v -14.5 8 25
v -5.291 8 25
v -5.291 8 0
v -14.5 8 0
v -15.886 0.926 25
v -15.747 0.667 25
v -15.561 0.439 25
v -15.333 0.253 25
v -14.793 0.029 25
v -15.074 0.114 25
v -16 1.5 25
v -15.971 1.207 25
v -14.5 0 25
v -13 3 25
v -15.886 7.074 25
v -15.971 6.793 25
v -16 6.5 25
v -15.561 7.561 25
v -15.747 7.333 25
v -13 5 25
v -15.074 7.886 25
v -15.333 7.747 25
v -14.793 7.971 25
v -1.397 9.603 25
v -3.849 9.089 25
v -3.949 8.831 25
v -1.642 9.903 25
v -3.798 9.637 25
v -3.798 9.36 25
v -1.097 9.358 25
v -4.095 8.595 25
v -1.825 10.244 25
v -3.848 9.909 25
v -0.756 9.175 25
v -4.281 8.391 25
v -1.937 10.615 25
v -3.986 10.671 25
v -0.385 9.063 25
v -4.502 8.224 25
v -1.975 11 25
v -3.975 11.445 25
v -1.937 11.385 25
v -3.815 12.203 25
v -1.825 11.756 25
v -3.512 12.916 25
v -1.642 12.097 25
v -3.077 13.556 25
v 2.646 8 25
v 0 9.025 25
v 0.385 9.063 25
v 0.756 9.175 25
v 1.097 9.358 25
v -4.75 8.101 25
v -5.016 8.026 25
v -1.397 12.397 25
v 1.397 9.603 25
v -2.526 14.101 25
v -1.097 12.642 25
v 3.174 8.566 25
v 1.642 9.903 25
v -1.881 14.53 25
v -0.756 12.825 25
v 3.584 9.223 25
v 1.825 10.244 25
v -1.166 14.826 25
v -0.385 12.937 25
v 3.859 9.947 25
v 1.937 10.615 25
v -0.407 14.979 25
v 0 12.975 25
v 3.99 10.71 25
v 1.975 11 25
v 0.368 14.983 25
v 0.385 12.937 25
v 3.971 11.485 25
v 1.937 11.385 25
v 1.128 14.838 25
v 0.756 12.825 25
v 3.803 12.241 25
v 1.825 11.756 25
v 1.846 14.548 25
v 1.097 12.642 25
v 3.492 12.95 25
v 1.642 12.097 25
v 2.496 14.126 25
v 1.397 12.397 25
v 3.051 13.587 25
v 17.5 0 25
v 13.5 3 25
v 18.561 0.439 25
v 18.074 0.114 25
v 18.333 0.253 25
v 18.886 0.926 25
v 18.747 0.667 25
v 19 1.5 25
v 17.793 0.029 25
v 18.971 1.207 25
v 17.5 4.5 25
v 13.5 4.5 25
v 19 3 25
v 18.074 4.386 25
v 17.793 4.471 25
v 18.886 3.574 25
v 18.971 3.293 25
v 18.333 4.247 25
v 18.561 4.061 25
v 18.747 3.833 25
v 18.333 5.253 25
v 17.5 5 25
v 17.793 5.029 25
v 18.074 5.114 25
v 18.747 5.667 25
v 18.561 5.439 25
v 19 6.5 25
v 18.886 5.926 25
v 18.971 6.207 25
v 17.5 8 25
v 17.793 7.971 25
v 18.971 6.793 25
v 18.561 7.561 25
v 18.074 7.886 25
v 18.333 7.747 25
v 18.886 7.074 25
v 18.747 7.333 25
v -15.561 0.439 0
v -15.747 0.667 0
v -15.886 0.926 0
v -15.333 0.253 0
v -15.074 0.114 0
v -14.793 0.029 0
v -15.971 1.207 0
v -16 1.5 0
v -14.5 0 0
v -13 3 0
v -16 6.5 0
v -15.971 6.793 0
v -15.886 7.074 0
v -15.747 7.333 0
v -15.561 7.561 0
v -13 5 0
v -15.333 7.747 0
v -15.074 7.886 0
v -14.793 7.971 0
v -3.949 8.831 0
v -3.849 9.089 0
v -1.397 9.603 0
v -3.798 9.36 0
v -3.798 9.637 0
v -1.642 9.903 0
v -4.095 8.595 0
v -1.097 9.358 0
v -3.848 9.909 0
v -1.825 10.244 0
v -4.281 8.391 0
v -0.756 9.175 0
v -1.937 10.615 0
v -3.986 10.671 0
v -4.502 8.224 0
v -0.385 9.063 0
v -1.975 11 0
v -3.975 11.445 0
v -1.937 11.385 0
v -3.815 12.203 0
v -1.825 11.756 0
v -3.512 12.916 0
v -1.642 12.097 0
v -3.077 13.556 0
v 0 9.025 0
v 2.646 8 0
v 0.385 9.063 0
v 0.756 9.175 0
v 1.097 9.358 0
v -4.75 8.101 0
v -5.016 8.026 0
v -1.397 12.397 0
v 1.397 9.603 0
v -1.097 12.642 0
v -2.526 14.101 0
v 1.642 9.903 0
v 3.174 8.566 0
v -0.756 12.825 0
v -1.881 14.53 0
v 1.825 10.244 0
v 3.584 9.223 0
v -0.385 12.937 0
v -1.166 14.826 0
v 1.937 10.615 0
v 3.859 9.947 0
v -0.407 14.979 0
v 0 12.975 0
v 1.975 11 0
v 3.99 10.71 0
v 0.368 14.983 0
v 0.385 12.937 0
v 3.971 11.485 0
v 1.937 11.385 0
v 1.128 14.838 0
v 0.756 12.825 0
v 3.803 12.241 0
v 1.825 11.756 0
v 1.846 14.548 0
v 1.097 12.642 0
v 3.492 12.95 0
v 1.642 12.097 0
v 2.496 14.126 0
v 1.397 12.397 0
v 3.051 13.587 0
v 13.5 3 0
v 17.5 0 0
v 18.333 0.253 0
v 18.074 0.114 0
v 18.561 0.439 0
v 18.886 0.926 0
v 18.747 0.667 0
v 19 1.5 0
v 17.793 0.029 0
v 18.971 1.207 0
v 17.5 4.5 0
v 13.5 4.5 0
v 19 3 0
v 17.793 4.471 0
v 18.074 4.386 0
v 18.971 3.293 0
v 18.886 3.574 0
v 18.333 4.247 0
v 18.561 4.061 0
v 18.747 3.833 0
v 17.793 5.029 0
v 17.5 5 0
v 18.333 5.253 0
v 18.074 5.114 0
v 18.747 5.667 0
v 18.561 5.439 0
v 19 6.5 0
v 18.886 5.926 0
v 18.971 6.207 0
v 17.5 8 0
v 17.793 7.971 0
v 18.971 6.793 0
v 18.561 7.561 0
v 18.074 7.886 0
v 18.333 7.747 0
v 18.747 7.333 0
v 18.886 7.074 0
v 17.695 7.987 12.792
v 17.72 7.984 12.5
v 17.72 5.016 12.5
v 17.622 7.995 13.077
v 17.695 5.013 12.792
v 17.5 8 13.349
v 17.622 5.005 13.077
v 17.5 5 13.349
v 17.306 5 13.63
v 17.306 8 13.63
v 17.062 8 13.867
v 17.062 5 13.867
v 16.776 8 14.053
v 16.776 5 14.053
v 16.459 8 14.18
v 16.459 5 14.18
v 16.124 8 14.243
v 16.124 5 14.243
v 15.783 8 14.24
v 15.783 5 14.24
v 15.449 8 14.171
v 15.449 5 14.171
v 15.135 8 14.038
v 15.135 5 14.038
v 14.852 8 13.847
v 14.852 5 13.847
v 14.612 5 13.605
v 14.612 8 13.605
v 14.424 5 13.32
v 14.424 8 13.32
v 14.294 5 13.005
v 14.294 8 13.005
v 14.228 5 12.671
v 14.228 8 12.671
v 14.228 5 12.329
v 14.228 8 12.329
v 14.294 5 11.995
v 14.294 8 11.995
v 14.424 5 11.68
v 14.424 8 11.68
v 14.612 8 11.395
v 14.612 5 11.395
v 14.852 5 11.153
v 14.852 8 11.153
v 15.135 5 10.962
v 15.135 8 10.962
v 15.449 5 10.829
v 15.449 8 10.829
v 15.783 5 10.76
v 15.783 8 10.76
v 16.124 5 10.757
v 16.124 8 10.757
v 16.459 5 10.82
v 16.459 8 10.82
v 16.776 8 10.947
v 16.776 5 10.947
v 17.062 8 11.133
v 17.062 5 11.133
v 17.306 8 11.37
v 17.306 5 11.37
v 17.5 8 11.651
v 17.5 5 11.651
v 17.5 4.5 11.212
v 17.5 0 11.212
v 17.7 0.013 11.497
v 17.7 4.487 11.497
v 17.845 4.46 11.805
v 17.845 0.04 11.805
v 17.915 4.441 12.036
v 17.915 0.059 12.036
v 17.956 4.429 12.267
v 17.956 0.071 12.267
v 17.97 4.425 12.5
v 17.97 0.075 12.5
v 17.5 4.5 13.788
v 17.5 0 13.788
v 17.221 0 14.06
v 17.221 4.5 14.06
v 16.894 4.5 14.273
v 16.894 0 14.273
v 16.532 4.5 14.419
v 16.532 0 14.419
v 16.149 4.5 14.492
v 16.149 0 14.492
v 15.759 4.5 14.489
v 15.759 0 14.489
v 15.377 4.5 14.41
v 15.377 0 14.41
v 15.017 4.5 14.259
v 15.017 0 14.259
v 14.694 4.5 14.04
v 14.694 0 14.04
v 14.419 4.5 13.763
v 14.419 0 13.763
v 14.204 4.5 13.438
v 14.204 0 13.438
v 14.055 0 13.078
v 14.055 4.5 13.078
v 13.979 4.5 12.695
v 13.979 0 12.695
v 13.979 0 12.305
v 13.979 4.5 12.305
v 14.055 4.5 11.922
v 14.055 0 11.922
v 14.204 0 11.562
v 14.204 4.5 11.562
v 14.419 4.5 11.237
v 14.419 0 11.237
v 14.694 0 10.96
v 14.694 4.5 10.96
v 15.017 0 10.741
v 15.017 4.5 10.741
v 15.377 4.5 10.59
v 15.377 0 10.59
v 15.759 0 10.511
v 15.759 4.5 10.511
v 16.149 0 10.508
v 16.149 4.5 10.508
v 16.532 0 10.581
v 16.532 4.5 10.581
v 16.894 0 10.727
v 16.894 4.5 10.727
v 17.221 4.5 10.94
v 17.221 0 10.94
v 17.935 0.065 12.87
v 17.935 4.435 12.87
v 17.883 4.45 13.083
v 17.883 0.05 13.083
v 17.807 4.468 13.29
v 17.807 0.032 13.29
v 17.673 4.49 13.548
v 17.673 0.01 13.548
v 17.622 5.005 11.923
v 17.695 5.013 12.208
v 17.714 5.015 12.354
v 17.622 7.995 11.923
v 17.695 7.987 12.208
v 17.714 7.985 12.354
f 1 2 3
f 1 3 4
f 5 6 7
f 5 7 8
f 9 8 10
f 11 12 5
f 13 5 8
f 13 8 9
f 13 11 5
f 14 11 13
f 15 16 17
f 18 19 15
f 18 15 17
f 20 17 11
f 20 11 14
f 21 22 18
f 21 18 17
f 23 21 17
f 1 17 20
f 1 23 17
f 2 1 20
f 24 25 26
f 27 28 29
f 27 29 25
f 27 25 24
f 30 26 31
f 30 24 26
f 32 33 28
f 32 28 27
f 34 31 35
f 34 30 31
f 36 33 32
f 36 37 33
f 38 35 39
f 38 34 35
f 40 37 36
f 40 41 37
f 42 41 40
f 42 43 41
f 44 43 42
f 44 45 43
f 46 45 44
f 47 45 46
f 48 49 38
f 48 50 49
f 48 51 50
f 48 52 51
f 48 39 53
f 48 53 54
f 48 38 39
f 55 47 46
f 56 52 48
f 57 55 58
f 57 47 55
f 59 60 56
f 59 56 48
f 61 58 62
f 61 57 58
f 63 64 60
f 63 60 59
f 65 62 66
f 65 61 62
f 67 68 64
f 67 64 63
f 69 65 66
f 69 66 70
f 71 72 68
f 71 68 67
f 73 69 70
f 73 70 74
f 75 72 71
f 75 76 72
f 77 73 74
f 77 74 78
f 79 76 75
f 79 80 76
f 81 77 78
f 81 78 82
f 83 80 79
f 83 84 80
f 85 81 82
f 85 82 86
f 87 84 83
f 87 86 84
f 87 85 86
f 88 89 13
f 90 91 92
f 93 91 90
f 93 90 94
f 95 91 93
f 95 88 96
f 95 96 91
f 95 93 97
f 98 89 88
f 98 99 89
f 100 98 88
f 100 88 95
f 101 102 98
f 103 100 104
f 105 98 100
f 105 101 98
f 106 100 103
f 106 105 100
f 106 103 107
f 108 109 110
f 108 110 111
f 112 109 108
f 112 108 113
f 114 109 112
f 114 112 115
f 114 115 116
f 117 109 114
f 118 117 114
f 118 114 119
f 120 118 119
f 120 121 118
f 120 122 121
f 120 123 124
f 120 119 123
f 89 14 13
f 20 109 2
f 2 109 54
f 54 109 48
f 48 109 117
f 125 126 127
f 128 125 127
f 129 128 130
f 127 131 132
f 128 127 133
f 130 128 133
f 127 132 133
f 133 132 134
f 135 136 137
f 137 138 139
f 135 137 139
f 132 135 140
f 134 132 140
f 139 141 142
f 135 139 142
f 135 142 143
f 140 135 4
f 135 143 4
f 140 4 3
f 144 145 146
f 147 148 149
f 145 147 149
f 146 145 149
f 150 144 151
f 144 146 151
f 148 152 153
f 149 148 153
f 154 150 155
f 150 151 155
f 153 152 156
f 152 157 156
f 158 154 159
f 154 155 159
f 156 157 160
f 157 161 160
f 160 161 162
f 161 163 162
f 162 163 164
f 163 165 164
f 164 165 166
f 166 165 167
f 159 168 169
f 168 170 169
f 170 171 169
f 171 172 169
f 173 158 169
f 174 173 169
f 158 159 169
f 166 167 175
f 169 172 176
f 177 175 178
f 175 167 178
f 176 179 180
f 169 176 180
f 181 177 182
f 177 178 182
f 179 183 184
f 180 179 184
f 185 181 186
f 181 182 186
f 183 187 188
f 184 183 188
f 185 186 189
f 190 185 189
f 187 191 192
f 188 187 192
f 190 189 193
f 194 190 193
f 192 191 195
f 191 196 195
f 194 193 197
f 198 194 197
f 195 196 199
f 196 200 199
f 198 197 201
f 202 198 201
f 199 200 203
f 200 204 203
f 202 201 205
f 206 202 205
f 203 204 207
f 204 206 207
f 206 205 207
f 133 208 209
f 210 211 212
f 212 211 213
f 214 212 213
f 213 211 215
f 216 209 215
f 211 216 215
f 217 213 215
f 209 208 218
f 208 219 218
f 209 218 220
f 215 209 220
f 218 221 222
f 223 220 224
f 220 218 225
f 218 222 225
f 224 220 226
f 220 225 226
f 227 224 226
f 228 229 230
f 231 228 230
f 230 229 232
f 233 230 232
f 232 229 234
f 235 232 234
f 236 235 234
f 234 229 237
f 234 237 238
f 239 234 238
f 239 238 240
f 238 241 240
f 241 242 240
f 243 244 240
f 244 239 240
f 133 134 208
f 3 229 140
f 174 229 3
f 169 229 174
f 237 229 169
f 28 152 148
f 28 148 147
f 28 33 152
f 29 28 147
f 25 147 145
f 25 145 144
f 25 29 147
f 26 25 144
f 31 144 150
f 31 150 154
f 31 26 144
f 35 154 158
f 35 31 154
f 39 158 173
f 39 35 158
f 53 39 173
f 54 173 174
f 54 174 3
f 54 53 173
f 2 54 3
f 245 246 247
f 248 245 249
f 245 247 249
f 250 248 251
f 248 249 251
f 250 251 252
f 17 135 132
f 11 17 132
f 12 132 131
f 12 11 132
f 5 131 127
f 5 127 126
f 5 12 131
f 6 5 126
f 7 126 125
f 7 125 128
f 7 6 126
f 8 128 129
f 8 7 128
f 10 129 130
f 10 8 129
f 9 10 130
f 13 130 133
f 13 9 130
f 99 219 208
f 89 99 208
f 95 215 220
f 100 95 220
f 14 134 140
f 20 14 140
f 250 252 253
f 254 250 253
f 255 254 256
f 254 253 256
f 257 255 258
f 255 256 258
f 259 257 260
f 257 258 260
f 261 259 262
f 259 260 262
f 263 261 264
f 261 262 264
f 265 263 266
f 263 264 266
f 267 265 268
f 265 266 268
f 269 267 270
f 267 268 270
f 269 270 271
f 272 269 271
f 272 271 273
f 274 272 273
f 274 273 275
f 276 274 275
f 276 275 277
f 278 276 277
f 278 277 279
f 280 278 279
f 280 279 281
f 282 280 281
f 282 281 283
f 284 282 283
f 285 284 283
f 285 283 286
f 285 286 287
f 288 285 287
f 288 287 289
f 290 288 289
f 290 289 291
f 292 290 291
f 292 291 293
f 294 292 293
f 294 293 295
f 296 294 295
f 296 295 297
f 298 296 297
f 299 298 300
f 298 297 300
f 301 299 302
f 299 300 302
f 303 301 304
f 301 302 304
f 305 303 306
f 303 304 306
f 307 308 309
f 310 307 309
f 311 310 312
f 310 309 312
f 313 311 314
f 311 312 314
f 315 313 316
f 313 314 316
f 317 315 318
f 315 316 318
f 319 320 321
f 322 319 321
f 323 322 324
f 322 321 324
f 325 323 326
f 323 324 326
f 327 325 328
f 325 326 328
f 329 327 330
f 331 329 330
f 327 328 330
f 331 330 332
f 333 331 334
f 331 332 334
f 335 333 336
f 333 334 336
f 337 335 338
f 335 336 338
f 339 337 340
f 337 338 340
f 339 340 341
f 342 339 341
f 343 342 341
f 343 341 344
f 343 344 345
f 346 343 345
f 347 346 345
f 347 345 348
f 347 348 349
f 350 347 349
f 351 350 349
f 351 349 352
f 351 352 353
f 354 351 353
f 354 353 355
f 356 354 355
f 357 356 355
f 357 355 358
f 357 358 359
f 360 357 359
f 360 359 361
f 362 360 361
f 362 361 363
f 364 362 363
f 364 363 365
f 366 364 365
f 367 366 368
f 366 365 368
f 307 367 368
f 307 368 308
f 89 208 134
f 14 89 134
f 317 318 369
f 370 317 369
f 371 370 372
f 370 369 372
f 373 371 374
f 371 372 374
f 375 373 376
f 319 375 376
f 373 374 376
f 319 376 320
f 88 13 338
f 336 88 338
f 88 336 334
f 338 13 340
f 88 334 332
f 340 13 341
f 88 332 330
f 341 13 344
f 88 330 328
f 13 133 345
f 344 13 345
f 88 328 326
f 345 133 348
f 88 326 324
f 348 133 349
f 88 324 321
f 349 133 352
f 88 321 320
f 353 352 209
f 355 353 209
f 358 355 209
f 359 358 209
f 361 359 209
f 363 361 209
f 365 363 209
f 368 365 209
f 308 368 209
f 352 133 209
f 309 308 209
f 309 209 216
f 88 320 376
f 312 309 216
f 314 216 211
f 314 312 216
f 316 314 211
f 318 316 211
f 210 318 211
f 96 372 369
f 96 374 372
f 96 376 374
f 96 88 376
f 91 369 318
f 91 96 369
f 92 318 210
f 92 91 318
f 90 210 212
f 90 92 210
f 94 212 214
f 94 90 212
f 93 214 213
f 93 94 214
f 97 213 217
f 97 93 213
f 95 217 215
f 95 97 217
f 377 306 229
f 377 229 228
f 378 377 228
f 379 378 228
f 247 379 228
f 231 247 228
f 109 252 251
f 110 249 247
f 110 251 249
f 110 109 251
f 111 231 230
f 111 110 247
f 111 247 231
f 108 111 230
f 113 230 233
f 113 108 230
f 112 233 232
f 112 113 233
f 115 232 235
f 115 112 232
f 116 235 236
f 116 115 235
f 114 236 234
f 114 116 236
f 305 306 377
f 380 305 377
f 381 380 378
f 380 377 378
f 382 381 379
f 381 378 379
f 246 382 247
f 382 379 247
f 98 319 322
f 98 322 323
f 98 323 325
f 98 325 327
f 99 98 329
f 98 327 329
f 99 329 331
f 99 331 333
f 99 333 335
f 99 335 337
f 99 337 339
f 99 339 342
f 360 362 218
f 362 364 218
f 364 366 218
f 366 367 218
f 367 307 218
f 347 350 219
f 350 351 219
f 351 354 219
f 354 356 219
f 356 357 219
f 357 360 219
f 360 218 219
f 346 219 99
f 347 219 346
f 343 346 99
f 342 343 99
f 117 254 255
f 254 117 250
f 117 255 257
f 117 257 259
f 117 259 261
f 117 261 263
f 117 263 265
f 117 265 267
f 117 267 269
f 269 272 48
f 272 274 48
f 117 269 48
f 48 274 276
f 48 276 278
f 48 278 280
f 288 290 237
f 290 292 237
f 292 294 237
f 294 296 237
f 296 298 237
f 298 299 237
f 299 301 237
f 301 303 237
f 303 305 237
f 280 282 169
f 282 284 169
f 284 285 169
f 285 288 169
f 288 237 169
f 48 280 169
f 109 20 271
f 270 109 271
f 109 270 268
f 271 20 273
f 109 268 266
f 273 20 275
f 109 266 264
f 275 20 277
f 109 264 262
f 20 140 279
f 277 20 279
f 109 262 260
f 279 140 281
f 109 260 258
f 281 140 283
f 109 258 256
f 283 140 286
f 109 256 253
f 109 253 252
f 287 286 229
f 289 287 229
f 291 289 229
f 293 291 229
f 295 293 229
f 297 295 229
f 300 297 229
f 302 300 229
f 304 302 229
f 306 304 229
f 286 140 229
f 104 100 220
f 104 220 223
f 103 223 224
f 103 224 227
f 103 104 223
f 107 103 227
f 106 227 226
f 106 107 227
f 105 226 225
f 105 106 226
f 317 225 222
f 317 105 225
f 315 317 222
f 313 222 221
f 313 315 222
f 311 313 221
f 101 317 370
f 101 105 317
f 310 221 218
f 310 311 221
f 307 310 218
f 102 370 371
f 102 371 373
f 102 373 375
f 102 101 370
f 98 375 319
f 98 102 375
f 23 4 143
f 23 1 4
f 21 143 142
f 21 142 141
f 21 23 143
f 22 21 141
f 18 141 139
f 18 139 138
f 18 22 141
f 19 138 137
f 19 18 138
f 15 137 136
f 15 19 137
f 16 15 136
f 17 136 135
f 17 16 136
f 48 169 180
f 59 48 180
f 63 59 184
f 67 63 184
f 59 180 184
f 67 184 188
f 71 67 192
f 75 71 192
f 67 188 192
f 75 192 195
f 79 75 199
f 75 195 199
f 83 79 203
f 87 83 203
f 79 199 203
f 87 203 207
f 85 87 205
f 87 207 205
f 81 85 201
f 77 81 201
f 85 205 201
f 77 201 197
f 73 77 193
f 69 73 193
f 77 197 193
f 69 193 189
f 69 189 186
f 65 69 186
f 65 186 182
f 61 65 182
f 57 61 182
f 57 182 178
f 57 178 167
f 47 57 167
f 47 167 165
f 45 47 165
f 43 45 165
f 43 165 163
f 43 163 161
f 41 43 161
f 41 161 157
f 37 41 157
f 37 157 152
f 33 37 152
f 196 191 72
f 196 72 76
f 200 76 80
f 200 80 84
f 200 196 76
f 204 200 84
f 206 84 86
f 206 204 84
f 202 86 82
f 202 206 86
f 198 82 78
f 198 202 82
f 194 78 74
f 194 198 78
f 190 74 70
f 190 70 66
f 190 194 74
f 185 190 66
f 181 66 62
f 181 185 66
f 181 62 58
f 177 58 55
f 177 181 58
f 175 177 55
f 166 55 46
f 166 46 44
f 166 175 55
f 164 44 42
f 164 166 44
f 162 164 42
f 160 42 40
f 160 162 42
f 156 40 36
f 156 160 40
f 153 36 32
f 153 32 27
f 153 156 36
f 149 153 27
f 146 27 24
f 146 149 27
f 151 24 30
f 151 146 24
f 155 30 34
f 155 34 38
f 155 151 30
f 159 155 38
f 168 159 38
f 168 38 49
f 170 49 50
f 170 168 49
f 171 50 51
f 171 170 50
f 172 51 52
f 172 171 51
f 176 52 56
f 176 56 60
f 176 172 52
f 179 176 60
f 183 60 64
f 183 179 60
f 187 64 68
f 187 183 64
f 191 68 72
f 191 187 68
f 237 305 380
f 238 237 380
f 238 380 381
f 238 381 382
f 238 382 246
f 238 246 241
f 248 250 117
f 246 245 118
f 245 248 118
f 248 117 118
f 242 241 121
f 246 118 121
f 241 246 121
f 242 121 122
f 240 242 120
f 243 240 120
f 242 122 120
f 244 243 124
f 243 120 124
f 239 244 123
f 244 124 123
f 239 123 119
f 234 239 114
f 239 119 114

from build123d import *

# Parameters (mm, degrees)
F0_R     = 1.975
F1_DEPTH = 25
F2_R     = 1.49999
F4_DEPTH = 25
F5_DEPTH = 4.8


# Not quite as in the source:
# - a fillet or chamfer is up to 0.001 mm smaller than in the source, because OpenCascade refuses the exact size
# - a feature names something its author has since deleted; it is built from what else it names


with BuildPart() as f1:
    # F0 (on Top) → F1 (new body)
    with BuildSketch(Plane.XY):
        with BuildLine():
            Line((19, 8), (2.6457513111, 8))
            ThreePointArc((2.6457513111, 8), (0, 15), (-2.6457513111, 8))
            Line((-2.6457513111, 8), (-16, 8))
            Line((-16, 8), (-16, 0))
            Line((-16, 0), (19, 0))
            Line((19, 0), (19, 3))
            Line((19, 3), (17.2, 3))
            Line((17.2, 3), (13.5, 3))
            Line((13.5, 3), (-13, 3))
            Line((-13, 3), (-13, 5))
            Line((-13, 5), (19, 5))
            Line((19, 5), (19, 8))
        make_face()
        with Locations((0, 11)):
            Circle(F0_R, mode=Mode.SUBTRACT)
        Polygon((17.2, 3), (19, 3), (19, 4.5), (13.5, 4.5), (13.5, 3), align=None)
    extrude(amount=F1_DEPTH)

    # F2 (radius 1.5 in the source; OpenCascade refuses exactly that, so slightly less here)
    f2_edges = [f1.edges().sort_by_distance(p)[0] for p in [
        (-16, 8, 12.5),
        (-16, 0, 12.5),
        (19, 0, 12.5),
        (19, 5, 12.5),
        (19, 4.5, 12.5),
        (-2.645751, 8, 12.5),
        (19, 8, 12.5),
    ]]
    fillet(f2_edges, radius=F2_R)

    # F3 (on face) → F4 (cut)
    with BuildSketch(Plane.XZ):
        with BuildLine():
            Line((17.50001, 11.6511331714), (17.50001, 13.3488668286))
            ThreePointArc((17.50001, 13.3488668286), (14.2196750343, 12.5), (17.50001, 11.6511331714))
        make_face()
        with BuildLine():
            ThreePointArc((17.7196750343, 12.5), (17.6638689709, 12.9384140794), (17.50001, 13.3488668286))
            Line((17.50001, 13.3488668286), (17.50001, 11.6511331714))
            ThreePointArc((17.50001, 11.6511331714), (17.6638689709, 12.0615859206), (17.7196750343, 12.5))
        make_face()
    extrude(amount=-F4_DEPTH, mode=Mode.SUBTRACT)

    # F3 (on face) → F5 (cut)
    with BuildSketch(Plane.XZ):
        with BuildLine():
            Line((17.50001, 13.3488668286), (17.50001, 13.7876625694))
            ThreePointArc((17.50001, 13.7876625694), (13.9696750343, 12.5), (17.50001, 11.2123374306))
            Line((17.50001, 11.2123374306), (17.50001, 11.6511331714))
            ThreePointArc((17.50001, 11.6511331714), (14.2196750343, 12.5), (17.50001, 13.3488668286))
        make_face()
        with BuildLine():
            ThreePointArc((17.50001, 11.2123374306), (17.8485935971, 11.8146788824), (17.9696750343, 12.5))
            ThreePointArc((17.9696750343, 12.5), (17.8485935971, 13.1853211176), (17.50001, 13.7876625694))
            Line((17.50001, 13.7876625694), (17.50001, 13.3488668286))
            ThreePointArc((17.50001, 13.3488668286), (17.6638689709, 12.9384140794), (17.7196750343, 12.5))
            ThreePointArc((17.7196750343, 12.5), (17.6638689709, 12.0615859206), (17.50001, 11.6511331714))
            Line((17.50001, 11.6511331714), (17.50001, 11.2123374306))
        make_face()
    extrude(amount=-F5_DEPTH, mode=Mode.SUBTRACT)


solid = f1.part
